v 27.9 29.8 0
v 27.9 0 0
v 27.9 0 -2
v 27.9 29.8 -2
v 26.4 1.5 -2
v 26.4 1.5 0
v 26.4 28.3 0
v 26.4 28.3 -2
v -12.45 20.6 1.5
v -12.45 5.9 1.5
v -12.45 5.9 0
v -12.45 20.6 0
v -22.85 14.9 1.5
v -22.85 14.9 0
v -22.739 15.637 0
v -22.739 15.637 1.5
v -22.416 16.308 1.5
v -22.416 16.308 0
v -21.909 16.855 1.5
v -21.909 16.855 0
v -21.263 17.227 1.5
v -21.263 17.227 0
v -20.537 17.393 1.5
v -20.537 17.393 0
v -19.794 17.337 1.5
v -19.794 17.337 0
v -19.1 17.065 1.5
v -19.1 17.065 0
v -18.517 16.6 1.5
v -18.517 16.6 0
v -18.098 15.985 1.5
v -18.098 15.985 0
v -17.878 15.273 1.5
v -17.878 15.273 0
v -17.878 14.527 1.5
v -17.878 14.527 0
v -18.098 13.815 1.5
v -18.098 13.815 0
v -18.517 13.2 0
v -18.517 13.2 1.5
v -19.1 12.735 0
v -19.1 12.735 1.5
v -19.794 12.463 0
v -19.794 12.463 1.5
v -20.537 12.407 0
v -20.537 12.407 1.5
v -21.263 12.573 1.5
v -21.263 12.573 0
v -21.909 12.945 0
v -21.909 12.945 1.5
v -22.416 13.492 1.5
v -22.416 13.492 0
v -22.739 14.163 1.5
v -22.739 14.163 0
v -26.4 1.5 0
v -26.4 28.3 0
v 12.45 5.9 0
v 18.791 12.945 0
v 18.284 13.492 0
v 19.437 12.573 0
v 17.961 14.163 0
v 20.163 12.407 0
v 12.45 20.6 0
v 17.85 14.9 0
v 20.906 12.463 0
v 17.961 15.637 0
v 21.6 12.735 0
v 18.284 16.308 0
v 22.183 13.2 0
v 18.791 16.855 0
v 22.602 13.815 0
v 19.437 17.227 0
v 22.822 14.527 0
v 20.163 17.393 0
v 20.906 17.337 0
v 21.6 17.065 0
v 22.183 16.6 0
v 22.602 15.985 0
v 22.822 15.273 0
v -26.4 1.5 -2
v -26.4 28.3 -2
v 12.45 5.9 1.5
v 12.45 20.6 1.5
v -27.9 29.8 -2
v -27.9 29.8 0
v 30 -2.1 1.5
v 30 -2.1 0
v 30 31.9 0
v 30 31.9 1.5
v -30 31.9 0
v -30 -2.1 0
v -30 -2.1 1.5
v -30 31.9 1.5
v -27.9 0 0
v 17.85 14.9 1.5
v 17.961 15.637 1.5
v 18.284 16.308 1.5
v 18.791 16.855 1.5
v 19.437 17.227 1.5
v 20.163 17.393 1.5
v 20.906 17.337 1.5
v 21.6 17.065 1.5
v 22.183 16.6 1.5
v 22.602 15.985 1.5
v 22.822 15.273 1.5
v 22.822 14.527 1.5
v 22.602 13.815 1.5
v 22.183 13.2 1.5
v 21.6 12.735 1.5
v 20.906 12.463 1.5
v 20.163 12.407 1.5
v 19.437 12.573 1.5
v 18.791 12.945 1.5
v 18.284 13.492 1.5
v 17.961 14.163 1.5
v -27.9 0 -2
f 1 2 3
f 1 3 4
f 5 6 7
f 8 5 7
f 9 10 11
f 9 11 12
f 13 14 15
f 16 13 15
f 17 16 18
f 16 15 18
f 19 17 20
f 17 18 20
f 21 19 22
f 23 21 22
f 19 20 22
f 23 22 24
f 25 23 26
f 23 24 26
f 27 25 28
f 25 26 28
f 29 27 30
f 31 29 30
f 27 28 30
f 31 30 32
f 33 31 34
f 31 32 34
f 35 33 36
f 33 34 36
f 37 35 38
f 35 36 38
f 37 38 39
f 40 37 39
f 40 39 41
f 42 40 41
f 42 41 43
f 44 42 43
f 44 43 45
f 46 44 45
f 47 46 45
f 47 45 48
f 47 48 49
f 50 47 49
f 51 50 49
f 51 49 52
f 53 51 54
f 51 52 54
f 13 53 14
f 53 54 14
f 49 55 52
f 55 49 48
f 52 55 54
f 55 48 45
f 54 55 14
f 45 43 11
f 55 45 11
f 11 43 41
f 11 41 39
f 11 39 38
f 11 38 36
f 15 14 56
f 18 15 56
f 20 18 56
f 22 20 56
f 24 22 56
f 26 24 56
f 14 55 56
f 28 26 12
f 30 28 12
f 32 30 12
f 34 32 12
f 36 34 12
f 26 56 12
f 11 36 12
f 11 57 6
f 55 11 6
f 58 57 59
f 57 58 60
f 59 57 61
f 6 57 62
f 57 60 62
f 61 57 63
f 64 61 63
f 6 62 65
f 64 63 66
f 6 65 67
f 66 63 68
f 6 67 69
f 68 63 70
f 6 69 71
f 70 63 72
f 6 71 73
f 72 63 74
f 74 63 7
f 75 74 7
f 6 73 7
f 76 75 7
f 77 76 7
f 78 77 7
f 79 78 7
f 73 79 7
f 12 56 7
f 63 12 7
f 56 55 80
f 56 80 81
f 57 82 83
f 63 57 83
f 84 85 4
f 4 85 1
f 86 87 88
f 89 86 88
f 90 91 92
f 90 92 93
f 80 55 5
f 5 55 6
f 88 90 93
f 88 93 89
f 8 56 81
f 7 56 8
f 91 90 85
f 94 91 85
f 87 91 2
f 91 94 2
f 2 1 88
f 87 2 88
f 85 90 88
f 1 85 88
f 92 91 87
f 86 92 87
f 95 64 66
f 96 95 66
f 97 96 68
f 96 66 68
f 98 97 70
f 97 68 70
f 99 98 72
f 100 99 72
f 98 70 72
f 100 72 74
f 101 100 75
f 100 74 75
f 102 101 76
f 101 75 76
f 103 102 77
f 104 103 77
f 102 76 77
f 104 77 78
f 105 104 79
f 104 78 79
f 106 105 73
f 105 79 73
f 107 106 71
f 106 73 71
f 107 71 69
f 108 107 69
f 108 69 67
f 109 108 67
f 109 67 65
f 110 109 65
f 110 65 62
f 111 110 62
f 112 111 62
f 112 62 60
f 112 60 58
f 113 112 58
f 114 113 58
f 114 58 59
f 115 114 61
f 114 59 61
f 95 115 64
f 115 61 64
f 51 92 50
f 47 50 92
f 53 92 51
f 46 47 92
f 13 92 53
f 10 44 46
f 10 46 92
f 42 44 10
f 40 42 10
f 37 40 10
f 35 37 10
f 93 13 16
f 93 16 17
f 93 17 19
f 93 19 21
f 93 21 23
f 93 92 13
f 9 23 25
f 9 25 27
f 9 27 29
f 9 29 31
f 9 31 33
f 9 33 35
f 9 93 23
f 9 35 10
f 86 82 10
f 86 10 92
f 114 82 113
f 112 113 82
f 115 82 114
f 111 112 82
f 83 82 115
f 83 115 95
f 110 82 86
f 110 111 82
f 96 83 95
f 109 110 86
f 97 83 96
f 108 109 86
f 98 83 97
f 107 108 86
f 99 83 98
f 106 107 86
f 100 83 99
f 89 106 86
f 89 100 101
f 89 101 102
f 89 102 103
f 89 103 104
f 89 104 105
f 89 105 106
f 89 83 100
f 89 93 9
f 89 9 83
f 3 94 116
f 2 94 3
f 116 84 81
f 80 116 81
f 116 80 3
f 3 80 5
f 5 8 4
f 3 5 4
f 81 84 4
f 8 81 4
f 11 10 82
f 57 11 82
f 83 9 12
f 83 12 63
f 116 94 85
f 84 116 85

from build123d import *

# Parameters (mm, degrees)
ESQUISSE2_W             = 55.8
ESQUISSE2_H             = 29.8
ESQUISSE2_W_2           = 52.8
ESQUISSE2_H_2           = 26.8
BOSS_EXTRU_1_DEPTH      = 2
ESQUISSE3_W             = 60
ESQUISSE3_H             = 34
BOSS_EXTRU_2_DEPTH      = 1.5
ESQUISSE4_W             = 24.9
ESQUISSE4_H             = 14.7
ENL_V_MAT_EXTRU_1_DEPTH = 1.5
ESQUISSE5_R             = 2.5
ENL_V_MAT_EXTRU_2_DEPTH = 1.5


with BuildPart() as part:
    # Esquisse2 → Boss.-Extru.1 (new body)
    with BuildSketch(Plane.XY):
        with Locations((0, 14.9)):
            Rectangle(ESQUISSE2_W, ESQUISSE2_H)
        with Locations((0, 14.9)):
            Rectangle(ESQUISSE2_W_2, ESQUISSE2_H_2, mode=Mode.SUBTRACT)
    extrude(amount=-BOSS_EXTRU_1_DEPTH)

    # Esquisse3 → Boss.-Extru.2 (add)
    with BuildSketch(Plane.XY):
        with Locations((0, 14.9)):
            Rectangle(ESQUISSE3_W, ESQUISSE3_H)
    extrude(amount=BOSS_EXTRU_2_DEPTH)

    # Esquisse4 → Enlèv. mat.-Extru.1 (cut)
    with BuildSketch(Plane.XY.offset(1.5)):
        with Locations((0, 13.25)):
            Rectangle(ESQUISSE4_W, ESQUISSE4_H)
    extrude(amount=-ENL_V_MAT_EXTRU_1_DEPTH, mode=Mode.SUBTRACT)

    # Esquisse5 → Enlèv. mat.-Extru.2 (cut)
    with BuildSketch(Plane(origin=(0, 0, 0), x_dir=(-1, 0, 0), z_dir=(0, 0, -1))):
        with Locations((20.35, 14.9)):
            Circle(ESQUISSE5_R)
        with Locations((-20.35, 14.9)):
            Circle(ESQUISSE5_R)
    extrude(amount=-ENL_V_MAT_EXTRU_2_DEPTH, mode=Mode.SUBTRACT)


solid = part.part
